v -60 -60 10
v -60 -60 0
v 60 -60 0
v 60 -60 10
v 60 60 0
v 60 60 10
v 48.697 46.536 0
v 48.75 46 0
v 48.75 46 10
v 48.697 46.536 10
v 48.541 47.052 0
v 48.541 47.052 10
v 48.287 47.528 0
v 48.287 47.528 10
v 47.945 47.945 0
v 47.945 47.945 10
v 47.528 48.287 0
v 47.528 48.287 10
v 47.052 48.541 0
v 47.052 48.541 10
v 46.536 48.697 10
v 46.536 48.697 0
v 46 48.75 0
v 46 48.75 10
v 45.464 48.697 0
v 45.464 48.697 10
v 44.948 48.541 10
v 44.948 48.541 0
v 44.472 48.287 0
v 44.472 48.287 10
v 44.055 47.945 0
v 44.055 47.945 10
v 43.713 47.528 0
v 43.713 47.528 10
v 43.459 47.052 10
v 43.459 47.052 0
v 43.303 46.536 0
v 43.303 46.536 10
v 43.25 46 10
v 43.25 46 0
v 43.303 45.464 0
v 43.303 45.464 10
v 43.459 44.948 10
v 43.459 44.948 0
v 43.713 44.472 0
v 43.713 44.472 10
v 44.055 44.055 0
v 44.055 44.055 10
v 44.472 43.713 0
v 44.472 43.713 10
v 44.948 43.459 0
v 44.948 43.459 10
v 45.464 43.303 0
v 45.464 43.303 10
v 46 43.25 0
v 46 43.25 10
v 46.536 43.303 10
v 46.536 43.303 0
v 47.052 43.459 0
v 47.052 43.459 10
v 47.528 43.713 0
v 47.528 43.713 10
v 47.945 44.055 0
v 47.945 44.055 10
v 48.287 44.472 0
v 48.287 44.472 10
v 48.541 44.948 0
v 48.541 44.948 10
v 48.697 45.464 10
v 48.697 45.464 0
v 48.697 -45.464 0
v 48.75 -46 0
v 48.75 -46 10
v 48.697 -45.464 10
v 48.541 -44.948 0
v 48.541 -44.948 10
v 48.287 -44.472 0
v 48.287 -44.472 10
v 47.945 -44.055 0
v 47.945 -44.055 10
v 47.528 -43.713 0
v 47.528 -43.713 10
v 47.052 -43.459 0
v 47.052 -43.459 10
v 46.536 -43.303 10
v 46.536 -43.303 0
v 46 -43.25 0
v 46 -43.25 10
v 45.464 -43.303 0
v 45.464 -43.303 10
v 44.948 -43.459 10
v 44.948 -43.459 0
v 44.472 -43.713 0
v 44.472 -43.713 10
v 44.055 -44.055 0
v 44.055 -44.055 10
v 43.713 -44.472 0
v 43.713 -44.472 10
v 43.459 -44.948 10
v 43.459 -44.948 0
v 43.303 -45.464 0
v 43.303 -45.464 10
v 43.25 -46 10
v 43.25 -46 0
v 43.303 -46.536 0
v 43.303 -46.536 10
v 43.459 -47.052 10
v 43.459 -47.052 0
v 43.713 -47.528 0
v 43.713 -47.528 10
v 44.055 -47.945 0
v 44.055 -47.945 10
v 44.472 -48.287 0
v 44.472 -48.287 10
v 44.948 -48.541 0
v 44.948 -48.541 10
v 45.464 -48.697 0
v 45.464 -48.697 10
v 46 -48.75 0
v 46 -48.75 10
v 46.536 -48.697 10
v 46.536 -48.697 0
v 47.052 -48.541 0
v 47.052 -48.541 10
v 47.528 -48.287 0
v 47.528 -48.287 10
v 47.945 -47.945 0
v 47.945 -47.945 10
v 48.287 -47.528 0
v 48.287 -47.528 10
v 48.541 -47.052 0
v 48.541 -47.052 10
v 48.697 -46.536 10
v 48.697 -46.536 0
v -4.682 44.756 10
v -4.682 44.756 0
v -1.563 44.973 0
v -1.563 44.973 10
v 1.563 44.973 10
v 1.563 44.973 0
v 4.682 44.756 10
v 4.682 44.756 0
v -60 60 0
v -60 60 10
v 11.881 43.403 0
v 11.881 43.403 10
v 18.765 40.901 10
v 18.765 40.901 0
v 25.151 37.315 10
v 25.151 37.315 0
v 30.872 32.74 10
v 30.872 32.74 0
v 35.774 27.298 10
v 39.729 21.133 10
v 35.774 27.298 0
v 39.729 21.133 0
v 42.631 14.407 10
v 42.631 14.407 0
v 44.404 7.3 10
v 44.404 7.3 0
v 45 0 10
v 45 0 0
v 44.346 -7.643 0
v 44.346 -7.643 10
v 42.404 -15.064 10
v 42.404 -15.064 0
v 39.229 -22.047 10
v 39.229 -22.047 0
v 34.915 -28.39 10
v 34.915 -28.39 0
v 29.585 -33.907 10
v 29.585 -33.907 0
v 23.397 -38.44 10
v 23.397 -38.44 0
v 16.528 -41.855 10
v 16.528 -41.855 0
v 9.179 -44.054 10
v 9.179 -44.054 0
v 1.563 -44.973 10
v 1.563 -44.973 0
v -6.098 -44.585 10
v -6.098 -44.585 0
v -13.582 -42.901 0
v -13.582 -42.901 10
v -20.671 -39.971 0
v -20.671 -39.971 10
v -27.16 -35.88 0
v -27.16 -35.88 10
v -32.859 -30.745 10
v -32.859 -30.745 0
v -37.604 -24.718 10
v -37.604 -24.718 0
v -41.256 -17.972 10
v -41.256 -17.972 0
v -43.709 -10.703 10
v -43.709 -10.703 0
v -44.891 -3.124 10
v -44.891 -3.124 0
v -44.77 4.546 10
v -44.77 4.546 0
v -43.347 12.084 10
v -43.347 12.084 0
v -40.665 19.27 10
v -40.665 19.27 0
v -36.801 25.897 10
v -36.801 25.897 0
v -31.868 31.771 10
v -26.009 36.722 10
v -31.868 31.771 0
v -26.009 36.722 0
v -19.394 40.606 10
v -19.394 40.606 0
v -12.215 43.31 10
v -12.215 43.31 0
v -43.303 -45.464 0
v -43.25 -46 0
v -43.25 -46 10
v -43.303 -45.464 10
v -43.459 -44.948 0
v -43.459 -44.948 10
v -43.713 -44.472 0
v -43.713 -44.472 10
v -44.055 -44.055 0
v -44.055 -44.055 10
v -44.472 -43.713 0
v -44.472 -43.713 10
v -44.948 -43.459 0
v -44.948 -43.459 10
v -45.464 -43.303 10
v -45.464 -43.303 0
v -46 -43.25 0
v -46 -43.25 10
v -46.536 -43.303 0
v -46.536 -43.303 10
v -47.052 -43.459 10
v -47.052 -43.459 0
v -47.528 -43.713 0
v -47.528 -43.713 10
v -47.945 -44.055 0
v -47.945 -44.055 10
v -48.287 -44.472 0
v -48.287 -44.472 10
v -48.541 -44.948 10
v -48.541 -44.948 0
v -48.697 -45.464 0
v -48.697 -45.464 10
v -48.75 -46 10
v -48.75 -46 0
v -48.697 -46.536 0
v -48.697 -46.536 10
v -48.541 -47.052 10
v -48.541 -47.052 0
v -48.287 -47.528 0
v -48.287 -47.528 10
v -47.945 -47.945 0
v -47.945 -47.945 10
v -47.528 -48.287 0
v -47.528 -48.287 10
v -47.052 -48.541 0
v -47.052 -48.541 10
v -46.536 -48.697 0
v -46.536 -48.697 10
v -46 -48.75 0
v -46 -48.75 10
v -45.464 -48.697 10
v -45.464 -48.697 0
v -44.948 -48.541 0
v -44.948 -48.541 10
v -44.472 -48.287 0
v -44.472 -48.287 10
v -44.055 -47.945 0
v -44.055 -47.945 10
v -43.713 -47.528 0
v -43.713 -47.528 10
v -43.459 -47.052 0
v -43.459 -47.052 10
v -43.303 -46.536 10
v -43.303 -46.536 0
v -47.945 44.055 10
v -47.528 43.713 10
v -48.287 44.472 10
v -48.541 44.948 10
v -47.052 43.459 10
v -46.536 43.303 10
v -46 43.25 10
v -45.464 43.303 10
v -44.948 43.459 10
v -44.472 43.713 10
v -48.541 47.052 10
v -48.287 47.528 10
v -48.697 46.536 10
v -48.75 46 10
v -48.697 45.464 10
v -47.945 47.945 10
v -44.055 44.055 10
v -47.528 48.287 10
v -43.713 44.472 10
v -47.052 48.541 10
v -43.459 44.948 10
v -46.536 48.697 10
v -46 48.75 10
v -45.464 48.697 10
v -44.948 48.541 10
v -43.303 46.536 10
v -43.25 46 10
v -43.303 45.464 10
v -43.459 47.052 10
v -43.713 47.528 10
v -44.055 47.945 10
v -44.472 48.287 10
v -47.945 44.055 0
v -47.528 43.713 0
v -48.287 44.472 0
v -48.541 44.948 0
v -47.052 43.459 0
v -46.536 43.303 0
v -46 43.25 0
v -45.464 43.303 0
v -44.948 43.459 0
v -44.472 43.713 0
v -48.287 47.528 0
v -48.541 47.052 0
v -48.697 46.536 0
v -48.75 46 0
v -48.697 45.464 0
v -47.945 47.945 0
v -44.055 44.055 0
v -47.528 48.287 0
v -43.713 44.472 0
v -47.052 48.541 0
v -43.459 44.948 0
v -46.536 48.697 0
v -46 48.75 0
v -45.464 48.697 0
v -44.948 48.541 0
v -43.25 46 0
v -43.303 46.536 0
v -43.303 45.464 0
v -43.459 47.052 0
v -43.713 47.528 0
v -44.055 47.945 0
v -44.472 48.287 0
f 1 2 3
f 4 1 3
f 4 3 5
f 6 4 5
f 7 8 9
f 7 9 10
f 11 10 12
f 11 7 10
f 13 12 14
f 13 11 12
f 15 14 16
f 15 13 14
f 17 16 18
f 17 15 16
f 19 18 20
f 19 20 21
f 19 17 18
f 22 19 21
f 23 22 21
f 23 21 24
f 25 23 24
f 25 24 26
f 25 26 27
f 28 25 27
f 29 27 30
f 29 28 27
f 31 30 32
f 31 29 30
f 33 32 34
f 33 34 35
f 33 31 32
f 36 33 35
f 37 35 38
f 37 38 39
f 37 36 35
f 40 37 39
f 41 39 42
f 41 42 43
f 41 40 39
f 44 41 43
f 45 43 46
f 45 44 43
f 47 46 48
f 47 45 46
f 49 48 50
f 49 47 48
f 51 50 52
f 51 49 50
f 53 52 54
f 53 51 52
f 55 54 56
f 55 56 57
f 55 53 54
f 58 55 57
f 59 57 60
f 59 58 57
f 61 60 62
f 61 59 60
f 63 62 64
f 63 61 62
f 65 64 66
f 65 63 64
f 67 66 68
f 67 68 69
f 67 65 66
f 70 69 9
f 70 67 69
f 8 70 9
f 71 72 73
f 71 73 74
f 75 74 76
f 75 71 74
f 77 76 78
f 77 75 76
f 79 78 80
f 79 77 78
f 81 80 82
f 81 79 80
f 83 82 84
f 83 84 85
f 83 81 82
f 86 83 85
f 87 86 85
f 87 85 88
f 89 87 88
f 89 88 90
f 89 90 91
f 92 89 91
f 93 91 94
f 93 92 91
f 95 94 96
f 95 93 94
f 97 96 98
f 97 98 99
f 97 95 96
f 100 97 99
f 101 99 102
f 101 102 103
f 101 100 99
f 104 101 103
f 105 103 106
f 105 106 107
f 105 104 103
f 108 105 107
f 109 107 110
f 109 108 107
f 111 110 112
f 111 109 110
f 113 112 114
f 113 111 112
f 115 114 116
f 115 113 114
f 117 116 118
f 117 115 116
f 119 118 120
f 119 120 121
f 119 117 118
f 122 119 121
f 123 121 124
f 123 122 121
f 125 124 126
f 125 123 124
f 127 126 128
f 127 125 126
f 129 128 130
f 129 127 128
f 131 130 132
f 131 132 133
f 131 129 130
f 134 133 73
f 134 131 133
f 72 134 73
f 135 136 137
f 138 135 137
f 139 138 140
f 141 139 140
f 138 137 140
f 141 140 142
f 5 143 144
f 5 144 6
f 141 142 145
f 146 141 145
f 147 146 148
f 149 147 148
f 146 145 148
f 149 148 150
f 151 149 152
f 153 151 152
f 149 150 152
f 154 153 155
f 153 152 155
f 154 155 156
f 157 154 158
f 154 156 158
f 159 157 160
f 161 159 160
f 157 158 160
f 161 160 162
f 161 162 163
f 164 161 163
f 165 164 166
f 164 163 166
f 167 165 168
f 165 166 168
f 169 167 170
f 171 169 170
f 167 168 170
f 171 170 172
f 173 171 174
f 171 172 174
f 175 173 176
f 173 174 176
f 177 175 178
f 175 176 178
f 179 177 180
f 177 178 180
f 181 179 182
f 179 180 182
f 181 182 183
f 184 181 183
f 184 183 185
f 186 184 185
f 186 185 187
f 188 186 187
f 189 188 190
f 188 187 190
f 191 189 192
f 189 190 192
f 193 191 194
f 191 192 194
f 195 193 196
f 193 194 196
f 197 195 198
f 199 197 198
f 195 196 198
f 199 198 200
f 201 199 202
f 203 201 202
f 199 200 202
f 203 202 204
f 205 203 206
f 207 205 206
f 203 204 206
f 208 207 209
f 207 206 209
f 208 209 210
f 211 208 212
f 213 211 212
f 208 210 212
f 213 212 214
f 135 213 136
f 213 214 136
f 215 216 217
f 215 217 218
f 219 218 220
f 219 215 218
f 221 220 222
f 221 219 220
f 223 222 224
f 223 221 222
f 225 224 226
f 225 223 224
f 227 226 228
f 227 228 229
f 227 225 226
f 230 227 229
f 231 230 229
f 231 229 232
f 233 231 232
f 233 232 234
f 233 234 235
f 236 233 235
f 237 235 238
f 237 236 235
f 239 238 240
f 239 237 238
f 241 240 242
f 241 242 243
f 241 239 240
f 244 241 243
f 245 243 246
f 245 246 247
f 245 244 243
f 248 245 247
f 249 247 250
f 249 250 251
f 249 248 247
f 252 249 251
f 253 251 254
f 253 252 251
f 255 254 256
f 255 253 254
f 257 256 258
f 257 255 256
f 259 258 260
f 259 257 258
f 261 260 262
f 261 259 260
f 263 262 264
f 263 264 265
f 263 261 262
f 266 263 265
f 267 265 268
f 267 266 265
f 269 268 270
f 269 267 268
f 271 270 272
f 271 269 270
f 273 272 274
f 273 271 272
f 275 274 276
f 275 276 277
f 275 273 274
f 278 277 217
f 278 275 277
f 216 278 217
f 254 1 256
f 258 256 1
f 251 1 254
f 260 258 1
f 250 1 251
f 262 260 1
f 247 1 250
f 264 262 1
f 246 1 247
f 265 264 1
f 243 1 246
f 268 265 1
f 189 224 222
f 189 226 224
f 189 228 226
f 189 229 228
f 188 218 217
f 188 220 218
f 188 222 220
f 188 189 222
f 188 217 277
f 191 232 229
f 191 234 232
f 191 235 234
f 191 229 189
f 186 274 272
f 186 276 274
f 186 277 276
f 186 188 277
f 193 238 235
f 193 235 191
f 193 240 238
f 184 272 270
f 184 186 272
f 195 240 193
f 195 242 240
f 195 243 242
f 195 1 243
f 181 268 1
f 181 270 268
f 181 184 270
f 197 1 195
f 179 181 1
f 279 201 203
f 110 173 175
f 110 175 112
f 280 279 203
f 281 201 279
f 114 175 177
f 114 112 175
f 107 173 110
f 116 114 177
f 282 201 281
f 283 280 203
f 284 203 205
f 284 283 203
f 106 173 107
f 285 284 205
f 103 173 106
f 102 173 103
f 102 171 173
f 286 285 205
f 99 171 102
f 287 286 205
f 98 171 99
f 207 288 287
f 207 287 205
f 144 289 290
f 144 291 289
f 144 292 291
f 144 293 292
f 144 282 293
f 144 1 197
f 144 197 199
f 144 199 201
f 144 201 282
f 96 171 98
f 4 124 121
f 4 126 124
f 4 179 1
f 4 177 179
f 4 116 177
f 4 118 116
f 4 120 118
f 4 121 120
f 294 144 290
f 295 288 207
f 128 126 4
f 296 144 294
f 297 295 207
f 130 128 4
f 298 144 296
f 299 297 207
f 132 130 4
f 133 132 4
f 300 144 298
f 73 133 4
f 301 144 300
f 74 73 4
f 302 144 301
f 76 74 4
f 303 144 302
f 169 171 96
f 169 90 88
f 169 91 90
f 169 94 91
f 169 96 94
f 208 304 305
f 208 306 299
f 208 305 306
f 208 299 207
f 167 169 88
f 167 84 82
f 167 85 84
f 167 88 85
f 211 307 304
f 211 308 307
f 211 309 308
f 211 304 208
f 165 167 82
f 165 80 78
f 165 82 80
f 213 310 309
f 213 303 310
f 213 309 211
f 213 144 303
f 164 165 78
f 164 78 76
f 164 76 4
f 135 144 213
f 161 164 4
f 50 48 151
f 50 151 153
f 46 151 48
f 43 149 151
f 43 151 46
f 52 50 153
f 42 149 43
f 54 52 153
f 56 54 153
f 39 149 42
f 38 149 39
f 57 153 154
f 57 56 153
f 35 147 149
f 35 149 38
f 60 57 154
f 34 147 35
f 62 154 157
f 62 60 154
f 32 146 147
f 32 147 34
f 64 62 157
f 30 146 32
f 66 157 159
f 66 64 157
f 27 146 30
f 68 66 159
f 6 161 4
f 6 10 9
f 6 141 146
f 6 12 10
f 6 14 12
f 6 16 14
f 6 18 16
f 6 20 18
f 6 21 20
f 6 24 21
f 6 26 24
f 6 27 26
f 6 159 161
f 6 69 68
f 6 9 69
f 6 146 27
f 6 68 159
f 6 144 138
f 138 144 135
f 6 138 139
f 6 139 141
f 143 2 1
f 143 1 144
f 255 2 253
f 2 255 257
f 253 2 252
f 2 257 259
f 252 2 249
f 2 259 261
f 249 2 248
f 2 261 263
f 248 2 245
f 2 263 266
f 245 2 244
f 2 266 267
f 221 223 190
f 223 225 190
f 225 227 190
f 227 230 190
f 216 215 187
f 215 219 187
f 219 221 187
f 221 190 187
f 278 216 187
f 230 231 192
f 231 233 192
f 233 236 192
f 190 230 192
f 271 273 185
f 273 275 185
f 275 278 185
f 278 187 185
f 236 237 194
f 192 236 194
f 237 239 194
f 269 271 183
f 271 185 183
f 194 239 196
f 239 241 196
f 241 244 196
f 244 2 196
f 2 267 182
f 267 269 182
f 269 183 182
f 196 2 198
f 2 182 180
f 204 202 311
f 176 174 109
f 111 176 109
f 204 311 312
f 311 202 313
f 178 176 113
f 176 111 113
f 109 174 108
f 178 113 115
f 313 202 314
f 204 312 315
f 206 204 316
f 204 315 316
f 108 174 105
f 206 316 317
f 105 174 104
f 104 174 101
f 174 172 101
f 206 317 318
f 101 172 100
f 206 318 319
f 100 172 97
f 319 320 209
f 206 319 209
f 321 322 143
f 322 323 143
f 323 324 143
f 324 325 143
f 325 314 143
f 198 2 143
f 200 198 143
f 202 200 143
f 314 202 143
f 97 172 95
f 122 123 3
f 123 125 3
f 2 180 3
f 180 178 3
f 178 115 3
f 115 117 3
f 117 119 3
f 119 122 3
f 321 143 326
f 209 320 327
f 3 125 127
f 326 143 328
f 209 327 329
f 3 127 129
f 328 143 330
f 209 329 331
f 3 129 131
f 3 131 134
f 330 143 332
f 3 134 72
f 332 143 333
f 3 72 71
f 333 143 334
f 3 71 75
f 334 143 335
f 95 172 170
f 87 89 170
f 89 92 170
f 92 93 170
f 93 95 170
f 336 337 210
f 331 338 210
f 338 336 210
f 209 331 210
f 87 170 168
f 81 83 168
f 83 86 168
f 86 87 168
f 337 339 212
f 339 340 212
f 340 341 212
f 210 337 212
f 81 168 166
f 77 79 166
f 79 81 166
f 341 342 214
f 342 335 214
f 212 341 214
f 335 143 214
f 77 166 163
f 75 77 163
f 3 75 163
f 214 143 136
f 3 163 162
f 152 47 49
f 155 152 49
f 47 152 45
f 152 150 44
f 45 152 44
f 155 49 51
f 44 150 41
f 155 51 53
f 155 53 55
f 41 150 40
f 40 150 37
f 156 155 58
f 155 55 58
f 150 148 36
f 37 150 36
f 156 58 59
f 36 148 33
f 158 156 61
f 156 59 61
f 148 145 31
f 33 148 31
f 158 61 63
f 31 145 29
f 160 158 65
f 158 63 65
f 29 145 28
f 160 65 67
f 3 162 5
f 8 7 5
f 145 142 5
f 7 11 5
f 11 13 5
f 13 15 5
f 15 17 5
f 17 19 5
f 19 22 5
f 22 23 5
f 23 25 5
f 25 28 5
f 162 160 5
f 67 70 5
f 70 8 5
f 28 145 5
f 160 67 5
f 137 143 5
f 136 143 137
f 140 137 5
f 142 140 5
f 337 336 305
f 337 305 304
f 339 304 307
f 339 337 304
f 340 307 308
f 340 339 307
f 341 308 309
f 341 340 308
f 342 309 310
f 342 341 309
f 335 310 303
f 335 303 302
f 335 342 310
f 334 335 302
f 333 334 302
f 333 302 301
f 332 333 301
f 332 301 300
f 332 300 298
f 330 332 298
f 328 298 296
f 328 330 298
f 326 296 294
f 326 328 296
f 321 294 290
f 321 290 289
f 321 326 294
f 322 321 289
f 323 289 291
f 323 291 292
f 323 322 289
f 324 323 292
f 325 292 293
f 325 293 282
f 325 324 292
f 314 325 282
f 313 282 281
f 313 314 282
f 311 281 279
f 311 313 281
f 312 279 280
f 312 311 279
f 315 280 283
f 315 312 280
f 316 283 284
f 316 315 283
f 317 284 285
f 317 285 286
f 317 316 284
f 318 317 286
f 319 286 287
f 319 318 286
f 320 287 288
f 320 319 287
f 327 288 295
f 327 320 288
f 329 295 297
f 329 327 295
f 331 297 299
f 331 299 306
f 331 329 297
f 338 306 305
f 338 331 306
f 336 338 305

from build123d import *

# Parameters (mm, degrees)
F0_W     = 120
F0_H     = 120
F0_R     = 2.75
F1_DEPTH = 10


with BuildPart() as f1:
    # F0 (on Top) → F1 (new body)
    with BuildSketch(Plane.XY):
        Rectangle(F0_W, F0_H)
        with Locations((-46, -46)):
            Circle(F0_R, mode=Mode.SUBTRACT)
        with Locations((46, -46)):
            Circle(F0_R, mode=Mode.SUBTRACT)
        with Locations((-46, 46)):
            Circle(F0_R, mode=Mode.SUBTRACT)
        with BuildLine():
            ThreePointArc((4.681734, 44.755797), (33.4341, 30.119113), (45, 0))
            ThreePointArc((45, 0), (-30.119113, -33.4341), (-4.681734, 44.755797))
            ThreePointArc((-4.681734, 44.755797), (0, 45), (4.681734, 44.755797))
        make_face(mode=Mode.SUBTRACT)
        with Locations((46, 46)):
            Circle(F0_R, mode=Mode.SUBTRACT)
    extrude(amount=F1_DEPTH)


solid = f1.part
